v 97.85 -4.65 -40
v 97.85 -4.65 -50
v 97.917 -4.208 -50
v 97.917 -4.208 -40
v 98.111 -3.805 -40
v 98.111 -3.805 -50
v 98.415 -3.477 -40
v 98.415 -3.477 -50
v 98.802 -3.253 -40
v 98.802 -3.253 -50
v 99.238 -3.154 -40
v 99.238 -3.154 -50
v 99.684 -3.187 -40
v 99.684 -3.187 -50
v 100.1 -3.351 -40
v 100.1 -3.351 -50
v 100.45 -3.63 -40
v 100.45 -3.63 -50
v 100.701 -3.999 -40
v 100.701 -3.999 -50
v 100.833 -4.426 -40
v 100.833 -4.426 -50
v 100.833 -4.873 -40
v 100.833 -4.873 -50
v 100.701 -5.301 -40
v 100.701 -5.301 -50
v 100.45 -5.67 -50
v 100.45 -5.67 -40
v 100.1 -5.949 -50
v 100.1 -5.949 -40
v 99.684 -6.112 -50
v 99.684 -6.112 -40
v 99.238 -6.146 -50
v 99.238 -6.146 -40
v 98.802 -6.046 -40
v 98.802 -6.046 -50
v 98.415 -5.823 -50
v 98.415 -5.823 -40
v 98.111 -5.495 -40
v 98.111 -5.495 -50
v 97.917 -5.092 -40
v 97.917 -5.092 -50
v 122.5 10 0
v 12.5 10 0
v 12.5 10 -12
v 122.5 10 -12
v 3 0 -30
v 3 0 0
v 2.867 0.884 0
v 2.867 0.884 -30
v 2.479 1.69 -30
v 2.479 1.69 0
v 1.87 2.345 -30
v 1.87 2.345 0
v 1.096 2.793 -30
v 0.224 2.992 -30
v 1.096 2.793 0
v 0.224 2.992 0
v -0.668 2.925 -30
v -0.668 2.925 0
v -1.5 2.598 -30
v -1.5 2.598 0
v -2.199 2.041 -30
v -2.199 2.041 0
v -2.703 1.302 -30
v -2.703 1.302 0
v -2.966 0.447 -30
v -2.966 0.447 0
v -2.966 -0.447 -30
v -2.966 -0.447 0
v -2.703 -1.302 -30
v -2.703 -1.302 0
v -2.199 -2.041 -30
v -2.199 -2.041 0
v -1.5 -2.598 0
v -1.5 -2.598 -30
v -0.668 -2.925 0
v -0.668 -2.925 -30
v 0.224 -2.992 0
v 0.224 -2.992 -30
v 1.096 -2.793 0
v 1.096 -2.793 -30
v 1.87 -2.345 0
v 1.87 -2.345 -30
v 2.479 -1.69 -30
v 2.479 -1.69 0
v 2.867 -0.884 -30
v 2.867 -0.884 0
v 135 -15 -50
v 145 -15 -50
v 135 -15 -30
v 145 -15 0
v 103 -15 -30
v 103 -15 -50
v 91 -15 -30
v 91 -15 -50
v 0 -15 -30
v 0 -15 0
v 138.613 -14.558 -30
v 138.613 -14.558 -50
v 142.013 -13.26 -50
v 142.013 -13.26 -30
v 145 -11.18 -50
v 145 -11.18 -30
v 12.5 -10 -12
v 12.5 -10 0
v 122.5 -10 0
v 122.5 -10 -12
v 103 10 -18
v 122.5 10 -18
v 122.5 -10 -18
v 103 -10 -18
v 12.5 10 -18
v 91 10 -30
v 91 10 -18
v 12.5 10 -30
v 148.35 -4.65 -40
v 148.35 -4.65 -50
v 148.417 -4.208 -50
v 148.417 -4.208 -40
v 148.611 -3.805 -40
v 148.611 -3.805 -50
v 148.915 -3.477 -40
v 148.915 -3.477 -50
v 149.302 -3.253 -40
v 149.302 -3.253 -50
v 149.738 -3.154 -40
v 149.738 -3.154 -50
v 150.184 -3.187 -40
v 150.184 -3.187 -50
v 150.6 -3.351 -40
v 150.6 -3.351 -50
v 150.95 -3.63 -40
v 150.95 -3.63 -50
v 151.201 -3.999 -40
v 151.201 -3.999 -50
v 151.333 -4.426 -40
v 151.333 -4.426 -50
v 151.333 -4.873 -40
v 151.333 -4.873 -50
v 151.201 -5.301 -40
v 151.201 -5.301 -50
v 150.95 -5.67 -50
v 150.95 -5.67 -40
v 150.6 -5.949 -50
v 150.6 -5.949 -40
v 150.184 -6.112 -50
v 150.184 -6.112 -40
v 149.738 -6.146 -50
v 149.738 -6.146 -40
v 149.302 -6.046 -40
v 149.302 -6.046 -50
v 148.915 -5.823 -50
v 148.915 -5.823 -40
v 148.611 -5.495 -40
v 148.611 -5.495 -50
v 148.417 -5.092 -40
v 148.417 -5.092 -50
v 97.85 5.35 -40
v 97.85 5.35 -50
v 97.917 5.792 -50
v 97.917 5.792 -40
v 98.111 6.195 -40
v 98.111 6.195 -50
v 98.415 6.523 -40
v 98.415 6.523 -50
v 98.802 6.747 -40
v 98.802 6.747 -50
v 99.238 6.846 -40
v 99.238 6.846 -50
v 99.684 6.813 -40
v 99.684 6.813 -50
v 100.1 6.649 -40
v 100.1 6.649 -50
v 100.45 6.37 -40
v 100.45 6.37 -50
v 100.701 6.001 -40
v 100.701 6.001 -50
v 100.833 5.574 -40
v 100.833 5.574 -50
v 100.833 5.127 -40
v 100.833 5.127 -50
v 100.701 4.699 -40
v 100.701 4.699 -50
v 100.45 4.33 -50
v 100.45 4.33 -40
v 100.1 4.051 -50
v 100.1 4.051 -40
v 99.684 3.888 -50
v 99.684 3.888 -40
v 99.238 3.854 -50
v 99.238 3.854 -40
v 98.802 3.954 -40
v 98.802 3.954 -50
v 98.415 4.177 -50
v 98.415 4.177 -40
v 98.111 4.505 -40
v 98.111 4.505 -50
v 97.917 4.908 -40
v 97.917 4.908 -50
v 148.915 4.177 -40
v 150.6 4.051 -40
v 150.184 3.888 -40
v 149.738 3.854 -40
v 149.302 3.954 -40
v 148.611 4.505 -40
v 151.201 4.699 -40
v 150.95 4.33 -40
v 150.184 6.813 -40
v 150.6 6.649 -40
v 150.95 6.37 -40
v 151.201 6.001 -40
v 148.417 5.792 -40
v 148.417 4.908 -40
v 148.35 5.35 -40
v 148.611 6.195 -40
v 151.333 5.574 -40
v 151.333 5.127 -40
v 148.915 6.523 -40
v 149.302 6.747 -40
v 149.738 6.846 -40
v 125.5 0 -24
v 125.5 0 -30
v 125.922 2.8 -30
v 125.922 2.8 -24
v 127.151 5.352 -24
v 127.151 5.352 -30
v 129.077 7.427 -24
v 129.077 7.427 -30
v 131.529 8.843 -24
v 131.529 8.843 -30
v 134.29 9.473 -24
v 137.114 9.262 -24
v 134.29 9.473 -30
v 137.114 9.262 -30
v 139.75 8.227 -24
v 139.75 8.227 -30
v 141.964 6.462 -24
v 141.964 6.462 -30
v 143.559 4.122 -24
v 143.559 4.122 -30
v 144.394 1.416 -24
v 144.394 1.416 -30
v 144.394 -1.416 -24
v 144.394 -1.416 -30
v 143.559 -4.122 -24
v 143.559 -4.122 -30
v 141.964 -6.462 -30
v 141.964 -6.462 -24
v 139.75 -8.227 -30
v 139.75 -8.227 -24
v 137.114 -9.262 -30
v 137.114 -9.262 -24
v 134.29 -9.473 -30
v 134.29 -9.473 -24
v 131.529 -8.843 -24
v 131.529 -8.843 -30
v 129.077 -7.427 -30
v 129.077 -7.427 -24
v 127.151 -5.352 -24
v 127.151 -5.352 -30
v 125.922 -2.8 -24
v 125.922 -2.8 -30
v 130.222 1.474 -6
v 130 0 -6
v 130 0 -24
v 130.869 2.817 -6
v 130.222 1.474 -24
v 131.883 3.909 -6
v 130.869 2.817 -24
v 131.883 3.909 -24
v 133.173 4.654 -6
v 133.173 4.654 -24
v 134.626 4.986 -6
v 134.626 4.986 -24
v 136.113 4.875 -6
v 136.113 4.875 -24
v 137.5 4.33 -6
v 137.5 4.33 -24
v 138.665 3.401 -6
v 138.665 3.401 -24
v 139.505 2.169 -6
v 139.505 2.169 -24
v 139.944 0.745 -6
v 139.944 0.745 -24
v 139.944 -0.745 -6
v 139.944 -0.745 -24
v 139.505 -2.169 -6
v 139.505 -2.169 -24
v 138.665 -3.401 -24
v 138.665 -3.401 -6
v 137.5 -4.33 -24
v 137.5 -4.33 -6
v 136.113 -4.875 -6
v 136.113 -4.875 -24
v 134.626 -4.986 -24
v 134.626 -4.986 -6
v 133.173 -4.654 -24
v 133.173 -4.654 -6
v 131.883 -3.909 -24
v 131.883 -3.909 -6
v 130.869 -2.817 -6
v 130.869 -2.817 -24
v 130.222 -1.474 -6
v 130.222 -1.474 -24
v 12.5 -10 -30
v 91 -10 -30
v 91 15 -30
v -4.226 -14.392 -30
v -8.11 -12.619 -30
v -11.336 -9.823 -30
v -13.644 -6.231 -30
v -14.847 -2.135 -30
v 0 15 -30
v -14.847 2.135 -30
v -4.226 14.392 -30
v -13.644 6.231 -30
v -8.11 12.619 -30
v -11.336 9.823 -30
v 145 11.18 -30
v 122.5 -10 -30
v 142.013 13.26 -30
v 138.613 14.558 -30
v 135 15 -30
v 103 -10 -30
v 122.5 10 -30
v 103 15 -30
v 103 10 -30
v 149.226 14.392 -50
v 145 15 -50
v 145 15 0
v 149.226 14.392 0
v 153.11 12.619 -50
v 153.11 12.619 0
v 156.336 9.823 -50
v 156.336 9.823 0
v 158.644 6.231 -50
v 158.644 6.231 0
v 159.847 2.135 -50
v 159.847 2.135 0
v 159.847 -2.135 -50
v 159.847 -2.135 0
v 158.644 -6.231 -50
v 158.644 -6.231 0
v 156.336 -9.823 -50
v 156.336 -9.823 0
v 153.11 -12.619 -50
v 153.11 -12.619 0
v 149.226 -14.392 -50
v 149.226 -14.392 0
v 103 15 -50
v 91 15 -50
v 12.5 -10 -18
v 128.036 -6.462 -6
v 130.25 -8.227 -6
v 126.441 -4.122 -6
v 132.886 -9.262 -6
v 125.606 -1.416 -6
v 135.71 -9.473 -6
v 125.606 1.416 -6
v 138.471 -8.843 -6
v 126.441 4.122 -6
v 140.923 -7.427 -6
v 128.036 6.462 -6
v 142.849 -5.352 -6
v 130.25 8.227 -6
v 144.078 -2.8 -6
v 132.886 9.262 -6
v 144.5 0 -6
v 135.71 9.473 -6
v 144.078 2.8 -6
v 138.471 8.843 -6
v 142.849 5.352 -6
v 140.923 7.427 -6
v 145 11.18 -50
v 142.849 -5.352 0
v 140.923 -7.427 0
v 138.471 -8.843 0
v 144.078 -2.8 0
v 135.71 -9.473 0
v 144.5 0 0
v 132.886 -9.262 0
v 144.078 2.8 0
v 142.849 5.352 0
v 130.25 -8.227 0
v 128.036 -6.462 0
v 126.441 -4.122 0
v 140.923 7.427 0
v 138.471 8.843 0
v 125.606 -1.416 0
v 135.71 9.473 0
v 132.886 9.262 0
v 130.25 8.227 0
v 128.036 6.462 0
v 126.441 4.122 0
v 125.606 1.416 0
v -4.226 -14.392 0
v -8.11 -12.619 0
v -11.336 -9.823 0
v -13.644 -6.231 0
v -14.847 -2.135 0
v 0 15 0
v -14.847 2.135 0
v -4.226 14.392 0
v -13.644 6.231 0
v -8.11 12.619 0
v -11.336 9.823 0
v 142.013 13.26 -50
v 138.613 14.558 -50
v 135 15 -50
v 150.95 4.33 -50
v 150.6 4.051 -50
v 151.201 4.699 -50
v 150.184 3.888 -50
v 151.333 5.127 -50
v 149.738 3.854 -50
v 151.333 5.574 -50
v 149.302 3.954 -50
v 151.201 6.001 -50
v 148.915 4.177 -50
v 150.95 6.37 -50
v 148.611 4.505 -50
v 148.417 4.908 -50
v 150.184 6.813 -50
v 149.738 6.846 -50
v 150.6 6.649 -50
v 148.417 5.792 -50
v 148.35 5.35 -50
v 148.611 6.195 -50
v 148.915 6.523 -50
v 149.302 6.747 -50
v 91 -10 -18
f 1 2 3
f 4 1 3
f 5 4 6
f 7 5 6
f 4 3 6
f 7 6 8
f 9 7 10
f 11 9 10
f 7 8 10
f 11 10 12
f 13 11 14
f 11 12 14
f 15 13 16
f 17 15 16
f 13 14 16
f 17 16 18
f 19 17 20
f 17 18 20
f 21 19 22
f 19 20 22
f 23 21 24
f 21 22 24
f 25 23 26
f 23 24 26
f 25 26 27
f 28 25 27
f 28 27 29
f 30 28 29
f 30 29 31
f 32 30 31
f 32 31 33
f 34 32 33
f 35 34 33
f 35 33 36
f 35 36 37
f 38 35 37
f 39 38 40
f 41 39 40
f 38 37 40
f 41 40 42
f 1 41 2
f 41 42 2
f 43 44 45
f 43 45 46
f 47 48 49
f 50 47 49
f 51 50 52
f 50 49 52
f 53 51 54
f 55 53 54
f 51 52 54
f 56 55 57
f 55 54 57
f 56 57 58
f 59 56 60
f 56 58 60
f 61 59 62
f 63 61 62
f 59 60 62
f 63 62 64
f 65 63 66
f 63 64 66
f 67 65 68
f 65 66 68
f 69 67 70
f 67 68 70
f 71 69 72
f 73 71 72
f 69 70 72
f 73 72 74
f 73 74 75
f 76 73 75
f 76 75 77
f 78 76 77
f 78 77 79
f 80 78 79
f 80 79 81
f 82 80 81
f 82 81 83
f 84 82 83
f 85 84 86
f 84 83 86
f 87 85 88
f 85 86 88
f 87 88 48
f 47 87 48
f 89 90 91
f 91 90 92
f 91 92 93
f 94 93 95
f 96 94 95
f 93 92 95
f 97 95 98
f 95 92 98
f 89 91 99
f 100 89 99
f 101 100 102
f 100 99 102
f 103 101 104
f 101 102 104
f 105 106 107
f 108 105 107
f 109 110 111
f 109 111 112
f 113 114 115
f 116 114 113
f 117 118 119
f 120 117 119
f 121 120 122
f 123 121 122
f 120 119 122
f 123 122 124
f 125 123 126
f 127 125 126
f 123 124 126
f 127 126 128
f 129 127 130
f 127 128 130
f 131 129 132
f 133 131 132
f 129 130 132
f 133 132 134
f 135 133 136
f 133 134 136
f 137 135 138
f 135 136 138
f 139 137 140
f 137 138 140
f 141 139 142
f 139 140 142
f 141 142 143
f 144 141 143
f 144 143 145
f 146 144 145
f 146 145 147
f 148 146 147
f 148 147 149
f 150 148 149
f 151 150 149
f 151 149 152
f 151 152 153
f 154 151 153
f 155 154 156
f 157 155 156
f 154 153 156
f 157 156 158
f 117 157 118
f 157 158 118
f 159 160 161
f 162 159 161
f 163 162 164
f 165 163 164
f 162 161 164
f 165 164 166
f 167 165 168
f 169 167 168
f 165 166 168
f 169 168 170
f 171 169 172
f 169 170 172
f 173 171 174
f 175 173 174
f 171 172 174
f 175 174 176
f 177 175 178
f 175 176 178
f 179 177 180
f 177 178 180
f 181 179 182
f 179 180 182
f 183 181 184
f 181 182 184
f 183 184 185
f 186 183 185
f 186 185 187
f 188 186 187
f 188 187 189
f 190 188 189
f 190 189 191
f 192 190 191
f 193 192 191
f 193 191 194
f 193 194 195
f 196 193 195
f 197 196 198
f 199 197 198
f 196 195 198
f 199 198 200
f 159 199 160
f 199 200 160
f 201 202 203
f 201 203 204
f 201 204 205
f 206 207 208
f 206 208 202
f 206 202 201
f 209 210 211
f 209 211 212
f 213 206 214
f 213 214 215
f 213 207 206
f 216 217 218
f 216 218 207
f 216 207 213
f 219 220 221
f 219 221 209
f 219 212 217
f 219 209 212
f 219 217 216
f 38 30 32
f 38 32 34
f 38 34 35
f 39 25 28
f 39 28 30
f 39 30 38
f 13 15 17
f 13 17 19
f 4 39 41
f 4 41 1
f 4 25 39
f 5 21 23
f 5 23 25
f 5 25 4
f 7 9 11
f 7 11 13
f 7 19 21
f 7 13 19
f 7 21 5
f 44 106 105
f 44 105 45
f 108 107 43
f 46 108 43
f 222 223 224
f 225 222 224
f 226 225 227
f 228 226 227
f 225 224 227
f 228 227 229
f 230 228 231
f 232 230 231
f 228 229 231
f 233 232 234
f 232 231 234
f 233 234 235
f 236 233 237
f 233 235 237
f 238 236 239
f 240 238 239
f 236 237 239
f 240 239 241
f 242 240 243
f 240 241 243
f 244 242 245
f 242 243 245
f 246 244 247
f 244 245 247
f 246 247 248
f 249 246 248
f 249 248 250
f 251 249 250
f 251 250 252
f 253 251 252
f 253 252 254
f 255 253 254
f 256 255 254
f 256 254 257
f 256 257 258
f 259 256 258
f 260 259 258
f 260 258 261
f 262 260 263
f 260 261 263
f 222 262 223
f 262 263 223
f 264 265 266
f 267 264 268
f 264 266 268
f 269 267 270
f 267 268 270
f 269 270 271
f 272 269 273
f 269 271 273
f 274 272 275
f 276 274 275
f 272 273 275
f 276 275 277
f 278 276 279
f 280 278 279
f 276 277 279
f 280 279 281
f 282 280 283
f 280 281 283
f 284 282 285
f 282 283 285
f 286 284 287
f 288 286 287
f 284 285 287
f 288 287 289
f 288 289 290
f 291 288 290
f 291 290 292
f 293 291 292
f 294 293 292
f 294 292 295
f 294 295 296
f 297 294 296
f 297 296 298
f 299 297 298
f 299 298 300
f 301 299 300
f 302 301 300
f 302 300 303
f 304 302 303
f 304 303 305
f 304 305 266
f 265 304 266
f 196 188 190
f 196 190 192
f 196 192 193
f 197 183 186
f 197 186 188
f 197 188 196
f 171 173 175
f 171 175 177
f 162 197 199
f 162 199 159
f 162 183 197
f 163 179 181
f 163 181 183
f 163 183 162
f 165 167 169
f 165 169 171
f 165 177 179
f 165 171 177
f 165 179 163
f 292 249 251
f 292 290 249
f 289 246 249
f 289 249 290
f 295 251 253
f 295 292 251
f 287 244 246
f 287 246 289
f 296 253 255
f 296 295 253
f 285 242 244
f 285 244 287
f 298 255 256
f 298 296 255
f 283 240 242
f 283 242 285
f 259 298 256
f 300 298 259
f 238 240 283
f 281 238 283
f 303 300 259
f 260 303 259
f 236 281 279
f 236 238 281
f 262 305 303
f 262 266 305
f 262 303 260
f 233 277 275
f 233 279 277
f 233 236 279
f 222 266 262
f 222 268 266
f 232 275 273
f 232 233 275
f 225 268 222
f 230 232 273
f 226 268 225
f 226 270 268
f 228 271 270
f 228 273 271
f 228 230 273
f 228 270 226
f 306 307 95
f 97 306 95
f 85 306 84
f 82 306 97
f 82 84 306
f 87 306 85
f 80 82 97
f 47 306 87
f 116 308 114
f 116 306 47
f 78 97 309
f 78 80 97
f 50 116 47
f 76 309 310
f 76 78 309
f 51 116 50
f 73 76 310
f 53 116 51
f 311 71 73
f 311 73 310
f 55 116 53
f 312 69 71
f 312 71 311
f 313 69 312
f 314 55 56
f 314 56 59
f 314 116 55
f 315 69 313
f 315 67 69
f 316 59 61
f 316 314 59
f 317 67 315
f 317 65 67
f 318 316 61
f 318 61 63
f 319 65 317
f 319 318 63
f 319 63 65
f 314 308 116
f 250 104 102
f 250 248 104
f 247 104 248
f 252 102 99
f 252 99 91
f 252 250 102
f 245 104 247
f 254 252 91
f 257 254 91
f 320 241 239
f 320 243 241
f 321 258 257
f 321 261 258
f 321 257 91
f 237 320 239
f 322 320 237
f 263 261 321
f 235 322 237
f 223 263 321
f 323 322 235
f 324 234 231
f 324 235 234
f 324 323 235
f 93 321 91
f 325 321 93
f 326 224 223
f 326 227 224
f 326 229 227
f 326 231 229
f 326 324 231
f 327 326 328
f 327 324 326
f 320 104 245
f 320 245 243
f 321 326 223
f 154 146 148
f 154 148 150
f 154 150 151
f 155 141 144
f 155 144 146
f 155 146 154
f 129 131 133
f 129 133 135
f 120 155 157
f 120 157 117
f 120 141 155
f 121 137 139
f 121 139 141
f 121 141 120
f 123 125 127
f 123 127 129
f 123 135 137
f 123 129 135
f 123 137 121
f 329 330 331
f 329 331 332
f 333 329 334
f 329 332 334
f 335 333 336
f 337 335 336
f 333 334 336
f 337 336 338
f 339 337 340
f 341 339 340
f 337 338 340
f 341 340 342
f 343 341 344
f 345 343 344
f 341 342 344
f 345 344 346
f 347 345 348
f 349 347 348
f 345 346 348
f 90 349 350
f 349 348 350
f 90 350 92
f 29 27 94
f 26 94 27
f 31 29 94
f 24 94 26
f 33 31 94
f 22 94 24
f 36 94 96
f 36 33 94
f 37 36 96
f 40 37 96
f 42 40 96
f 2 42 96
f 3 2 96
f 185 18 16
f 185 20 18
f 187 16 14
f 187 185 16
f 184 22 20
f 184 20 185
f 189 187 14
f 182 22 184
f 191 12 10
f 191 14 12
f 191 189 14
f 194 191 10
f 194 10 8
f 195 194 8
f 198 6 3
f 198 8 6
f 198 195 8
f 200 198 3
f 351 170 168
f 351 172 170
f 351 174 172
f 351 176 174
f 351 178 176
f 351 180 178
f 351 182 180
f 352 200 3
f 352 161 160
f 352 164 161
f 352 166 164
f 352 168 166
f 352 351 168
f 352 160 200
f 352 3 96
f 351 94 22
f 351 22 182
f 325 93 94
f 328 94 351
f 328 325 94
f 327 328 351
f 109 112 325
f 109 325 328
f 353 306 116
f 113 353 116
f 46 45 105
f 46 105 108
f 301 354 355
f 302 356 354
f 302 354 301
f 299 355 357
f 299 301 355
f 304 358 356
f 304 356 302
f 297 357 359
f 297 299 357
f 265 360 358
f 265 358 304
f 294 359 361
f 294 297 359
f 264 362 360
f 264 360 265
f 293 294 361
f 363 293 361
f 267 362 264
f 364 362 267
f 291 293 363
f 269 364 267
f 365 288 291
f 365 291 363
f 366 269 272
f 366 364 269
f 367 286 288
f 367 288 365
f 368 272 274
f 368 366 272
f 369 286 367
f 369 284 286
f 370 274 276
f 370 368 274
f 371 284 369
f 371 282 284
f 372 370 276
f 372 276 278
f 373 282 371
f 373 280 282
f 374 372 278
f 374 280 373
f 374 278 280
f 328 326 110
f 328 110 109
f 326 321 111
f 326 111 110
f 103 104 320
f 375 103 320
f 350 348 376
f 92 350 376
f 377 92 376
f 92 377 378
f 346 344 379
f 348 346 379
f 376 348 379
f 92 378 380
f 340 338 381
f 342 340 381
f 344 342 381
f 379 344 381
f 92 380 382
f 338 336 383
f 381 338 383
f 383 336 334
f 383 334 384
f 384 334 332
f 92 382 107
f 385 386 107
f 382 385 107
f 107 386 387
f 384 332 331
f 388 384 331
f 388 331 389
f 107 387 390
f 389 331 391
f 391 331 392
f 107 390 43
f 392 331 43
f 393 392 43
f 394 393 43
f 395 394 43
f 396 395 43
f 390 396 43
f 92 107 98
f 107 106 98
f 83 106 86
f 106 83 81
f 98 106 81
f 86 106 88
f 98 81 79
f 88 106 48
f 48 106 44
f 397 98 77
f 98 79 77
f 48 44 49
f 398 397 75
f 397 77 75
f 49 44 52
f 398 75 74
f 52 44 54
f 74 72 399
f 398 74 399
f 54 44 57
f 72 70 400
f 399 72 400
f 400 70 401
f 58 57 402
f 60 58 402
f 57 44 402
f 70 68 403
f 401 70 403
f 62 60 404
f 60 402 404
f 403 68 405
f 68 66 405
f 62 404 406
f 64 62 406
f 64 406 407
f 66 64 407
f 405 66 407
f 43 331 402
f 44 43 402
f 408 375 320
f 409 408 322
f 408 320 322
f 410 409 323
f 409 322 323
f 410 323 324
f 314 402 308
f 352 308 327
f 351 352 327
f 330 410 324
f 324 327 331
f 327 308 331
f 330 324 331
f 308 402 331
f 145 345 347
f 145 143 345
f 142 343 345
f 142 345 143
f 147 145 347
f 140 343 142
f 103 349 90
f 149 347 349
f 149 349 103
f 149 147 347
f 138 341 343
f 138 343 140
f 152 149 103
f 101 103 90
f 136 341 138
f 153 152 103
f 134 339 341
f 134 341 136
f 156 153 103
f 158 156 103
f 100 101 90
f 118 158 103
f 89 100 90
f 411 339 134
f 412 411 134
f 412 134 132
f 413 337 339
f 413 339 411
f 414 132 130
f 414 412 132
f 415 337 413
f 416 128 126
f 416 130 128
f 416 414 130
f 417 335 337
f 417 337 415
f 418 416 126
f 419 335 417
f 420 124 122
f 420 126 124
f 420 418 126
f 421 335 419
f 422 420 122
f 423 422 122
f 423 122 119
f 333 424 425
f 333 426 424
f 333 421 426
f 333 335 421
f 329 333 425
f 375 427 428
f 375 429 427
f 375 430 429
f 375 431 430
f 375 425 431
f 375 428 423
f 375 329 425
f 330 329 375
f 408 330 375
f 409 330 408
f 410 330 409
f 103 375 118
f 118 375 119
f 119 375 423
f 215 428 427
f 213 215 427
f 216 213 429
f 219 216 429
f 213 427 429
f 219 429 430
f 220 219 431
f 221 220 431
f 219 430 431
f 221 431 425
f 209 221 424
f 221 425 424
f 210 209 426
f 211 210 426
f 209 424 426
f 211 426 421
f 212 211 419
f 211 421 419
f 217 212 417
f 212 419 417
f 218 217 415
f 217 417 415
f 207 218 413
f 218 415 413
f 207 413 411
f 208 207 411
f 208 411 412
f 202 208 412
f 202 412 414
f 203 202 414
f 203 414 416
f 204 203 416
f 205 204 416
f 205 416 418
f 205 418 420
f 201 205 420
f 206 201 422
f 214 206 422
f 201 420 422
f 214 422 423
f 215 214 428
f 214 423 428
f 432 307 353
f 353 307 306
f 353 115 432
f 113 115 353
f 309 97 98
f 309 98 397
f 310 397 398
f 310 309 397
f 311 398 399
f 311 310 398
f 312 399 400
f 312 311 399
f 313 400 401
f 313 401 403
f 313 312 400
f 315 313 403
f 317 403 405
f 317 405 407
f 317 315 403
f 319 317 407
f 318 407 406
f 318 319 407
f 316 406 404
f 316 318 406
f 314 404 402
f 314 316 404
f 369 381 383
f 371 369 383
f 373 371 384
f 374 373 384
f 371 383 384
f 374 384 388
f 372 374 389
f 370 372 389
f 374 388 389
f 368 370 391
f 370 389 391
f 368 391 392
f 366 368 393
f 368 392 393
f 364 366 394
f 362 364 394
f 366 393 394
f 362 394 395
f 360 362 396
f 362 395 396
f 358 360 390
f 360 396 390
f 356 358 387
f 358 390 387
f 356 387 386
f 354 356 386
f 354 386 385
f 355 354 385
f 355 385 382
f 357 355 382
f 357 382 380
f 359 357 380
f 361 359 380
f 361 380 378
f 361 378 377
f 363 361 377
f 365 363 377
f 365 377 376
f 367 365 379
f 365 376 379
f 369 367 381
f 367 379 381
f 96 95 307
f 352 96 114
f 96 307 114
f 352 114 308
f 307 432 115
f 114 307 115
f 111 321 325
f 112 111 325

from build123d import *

# Parameters (mm, degrees)
BOSS_EXTRUDE1_DEPTH   = 30
SKETCH2_R             = 3
CUT_EXTRUDE1_DEPTH    = 30
SKETCH3_R             = 9.5
CUT_EXTRUDE2_DEPTH    = 6
SKETCH4_R             = 9.5
CUT_EXTRUDE3_DEPTH    = 6
CUT_EXTRUDE4_REACH    = 26
SKETCH5_R             = 5
SKETCH6_W             = 110
SKETCH6_H             = 20
CUT_EXTRUDE5_DEPTH    = 12
SKETCH7_W             = 110
SKETCH7_H             = 20
CUT_EXTRUDE6_DEPTH    = 12
SKETCH8_W             = 12
SKETCH8_H             = 30
BOSS_EXTRUDE2_DEPTH   = 32
CUT_EXTRUDE7_DEPTH    = 35
BOSS_EXTRUDE3_DEPTH   = 50
SKETCH11_R            = 1.5
CUT_EXTRUDE8_DEPTH    = 10
SKETCH13_R            = 1.5
CUT_EXTRUDE9_DEPTH    = 10
SKETCH12_R            = 1.5
CUT_EXTRUDE10_DEPTH   = 10
BODY_MOVE_COPY1_ANGLE = 90


with BuildPart() as part:
    # Sketch1 → Boss-Extrude1 (new body)
    with BuildSketch(Plane(origin=(0, 0, 0), x_dir=(0, 0, -1), z_dir=(1, 0, 0))):
        with BuildLine():
            Line((0, 30), (135, 30))
            ThreePointArc((135, 30), (150, 15), (135, 0))
            Line((135, 0), (0, 0))
            ThreePointArc((0, 0), (-15, 15), (0, 30))
        make_face()
    extrude(amount=BOSS_EXTRUDE1_DEPTH)

    # Sketch2 → Cut-Extrude1 (cut)
    with BuildSketch(Plane(origin=(30, 0, 0), x_dir=(0, 0, -1), z_dir=(1, 0, 0))):
        with Locations((0, 15)):
            Circle(SKETCH2_R)
    extrude(amount=-CUT_EXTRUDE1_DEPTH, mode=Mode.SUBTRACT)

    # Sketch3 → Cut-Extrude2 (cut)
    with BuildSketch(Plane(origin=(30, 0, 0), x_dir=(0, 0, -1), z_dir=(1, 0, 0))):
        with Locations((135, 15)):
            Circle(SKETCH3_R)
    extrude(amount=-CUT_EXTRUDE2_DEPTH, mode=Mode.SUBTRACT)

    # Sketch4 → Cut-Extrude3 (cut)
    with BuildSketch(Plane.ZY):
        with Locations((-135, 15)):
            Circle(SKETCH4_R)
    extrude(amount=-CUT_EXTRUDE3_DEPTH, mode=Mode.SUBTRACT)

    # Sketch5 → Cut-Extrude4 (cut, up to next)
    with BuildSketch(Plane.ZY.offset(-6), mode=Mode.PRIVATE) as cut_extrude4_sk1:
        with Locations((-135, 15)):
            Circle(SKETCH5_R)
    cut_extrude4_tool1 = extrude(cut_extrude4_sk1.sketch, amount=-CUT_EXTRUDE4_REACH, mode=Mode.PRIVATE) & part.part
    add(cut_extrude4_tool1.solids().sort_by_distance((6, 15, -135))[0], mode=Mode.SUBTRACT)

    # Sketch6 → Cut-Extrude5 (cut)
    with BuildSketch(Plane(origin=(30, 0, 0), x_dir=(0, 0, -1), z_dir=(1, 0, 0))):
        with Locations((67.5, 15)):
            Rectangle(SKETCH6_W, SKETCH6_H)
    extrude(amount=-CUT_EXTRUDE5_DEPTH, mode=Mode.SUBTRACT)

    # Sketch7 → Cut-Extrude6 (cut)
    with BuildSketch(Plane.ZY):
        with Locations((-67.5, 15)):
            Rectangle(SKETCH7_W, SKETCH7_H)
    extrude(amount=-CUT_EXTRUDE6_DEPTH, mode=Mode.SUBTRACT)

    # Sketch8 → Boss-Extrude2 (add)
    with BuildSketch(Plane.ZY.offset(-12)):
        with Locations((-97, 15)):
            Rectangle(SKETCH8_W, SKETCH8_H)
        with Locations((-151, 15)):
            Rectangle(SKETCH8_W, SKETCH8_H)
    extrude(amount=BOSS_EXTRUDE2_DEPTH)

    # Sketch9 → Cut-Extrude7 (cut)
    with BuildSketch(Plane(origin=(12, 0, 0), x_dir=(0, 0, -1), z_dir=(1, 0, 0))):
        with BuildLine():
            Line((145, 30), (145, 26.180339887))
            ThreePointArc((145, 26.180339887), (150, 15), (145, 3.819660113))
            Line((145, 3.819660113), (145, 0))
            Line((145, 0), (157, 0))
            Line((157, 0), (157, 30))
            Line((157, 30), (145, 30))
        make_face()
    extrude(amount=-CUT_EXTRUDE7_DEPTH, mode=Mode.SUBTRACT)

    # Sketch10 → Boss-Extrude3 (add)
    with BuildSketch(Plane(origin=(30, 0, 0), x_dir=(0, 0, -1), z_dir=(1, 0, 0))):
        with BuildLine():
            Line((135, 30), (145, 30))
            ThreePointArc((145, 30), (160, 15), (145, 0))
            Line((145, 0), (135, 0))
            ThreePointArc((135, 0), (150, 15), (135, 30))
        make_face()
    extrude(amount=-BOSS_EXTRUDE3_DEPTH)

    # Sketch11 → Cut-Extrude8 (cut)
    with BuildSketch(Plane.ZY.offset(20)):
        with Locations((-149.85, 10.350189987)):
            Circle(SKETCH11_R)
    extrude(amount=-CUT_EXTRUDE8_DEPTH, mode=Mode.SUBTRACT)

    # Sketch13 → Cut-Extrude9 (cut)
    with BuildSketch(Plane.ZY.offset(20)):
        with Locations((-149.85, 20.350189987)):
            Circle(SKETCH13_R)
        with Locations((-99.35, 20.350189987)):
            Circle(SKETCH13_R)
    extrude(amount=-CUT_EXTRUDE9_DEPTH, mode=Mode.SUBTRACT)

    # Sketch12 → Cut-Extrude10 (cut)
    with BuildSketch(Plane.ZY.offset(20)):
        with Locations((-99.35, 10.350189987)):
            Circle(SKETCH12_R)
    extrude(amount=-CUT_EXTRUDE10_DEPTH, mode=Mode.SUBTRACT)


with BuildPart() as part_1:
    # Body-Move/Copy1: moved
    add(part.part.rotate(Axis((5, 0, -72.5), (0, -1, 0)), BODY_MOVE_COPY1_ANGLE))


with BuildPart() as part_2:
    # Body-Move/Copy2: moved
    add(part_1.part.moved(Location((67.5, -15, 47.5))))


solid = part_2.part
